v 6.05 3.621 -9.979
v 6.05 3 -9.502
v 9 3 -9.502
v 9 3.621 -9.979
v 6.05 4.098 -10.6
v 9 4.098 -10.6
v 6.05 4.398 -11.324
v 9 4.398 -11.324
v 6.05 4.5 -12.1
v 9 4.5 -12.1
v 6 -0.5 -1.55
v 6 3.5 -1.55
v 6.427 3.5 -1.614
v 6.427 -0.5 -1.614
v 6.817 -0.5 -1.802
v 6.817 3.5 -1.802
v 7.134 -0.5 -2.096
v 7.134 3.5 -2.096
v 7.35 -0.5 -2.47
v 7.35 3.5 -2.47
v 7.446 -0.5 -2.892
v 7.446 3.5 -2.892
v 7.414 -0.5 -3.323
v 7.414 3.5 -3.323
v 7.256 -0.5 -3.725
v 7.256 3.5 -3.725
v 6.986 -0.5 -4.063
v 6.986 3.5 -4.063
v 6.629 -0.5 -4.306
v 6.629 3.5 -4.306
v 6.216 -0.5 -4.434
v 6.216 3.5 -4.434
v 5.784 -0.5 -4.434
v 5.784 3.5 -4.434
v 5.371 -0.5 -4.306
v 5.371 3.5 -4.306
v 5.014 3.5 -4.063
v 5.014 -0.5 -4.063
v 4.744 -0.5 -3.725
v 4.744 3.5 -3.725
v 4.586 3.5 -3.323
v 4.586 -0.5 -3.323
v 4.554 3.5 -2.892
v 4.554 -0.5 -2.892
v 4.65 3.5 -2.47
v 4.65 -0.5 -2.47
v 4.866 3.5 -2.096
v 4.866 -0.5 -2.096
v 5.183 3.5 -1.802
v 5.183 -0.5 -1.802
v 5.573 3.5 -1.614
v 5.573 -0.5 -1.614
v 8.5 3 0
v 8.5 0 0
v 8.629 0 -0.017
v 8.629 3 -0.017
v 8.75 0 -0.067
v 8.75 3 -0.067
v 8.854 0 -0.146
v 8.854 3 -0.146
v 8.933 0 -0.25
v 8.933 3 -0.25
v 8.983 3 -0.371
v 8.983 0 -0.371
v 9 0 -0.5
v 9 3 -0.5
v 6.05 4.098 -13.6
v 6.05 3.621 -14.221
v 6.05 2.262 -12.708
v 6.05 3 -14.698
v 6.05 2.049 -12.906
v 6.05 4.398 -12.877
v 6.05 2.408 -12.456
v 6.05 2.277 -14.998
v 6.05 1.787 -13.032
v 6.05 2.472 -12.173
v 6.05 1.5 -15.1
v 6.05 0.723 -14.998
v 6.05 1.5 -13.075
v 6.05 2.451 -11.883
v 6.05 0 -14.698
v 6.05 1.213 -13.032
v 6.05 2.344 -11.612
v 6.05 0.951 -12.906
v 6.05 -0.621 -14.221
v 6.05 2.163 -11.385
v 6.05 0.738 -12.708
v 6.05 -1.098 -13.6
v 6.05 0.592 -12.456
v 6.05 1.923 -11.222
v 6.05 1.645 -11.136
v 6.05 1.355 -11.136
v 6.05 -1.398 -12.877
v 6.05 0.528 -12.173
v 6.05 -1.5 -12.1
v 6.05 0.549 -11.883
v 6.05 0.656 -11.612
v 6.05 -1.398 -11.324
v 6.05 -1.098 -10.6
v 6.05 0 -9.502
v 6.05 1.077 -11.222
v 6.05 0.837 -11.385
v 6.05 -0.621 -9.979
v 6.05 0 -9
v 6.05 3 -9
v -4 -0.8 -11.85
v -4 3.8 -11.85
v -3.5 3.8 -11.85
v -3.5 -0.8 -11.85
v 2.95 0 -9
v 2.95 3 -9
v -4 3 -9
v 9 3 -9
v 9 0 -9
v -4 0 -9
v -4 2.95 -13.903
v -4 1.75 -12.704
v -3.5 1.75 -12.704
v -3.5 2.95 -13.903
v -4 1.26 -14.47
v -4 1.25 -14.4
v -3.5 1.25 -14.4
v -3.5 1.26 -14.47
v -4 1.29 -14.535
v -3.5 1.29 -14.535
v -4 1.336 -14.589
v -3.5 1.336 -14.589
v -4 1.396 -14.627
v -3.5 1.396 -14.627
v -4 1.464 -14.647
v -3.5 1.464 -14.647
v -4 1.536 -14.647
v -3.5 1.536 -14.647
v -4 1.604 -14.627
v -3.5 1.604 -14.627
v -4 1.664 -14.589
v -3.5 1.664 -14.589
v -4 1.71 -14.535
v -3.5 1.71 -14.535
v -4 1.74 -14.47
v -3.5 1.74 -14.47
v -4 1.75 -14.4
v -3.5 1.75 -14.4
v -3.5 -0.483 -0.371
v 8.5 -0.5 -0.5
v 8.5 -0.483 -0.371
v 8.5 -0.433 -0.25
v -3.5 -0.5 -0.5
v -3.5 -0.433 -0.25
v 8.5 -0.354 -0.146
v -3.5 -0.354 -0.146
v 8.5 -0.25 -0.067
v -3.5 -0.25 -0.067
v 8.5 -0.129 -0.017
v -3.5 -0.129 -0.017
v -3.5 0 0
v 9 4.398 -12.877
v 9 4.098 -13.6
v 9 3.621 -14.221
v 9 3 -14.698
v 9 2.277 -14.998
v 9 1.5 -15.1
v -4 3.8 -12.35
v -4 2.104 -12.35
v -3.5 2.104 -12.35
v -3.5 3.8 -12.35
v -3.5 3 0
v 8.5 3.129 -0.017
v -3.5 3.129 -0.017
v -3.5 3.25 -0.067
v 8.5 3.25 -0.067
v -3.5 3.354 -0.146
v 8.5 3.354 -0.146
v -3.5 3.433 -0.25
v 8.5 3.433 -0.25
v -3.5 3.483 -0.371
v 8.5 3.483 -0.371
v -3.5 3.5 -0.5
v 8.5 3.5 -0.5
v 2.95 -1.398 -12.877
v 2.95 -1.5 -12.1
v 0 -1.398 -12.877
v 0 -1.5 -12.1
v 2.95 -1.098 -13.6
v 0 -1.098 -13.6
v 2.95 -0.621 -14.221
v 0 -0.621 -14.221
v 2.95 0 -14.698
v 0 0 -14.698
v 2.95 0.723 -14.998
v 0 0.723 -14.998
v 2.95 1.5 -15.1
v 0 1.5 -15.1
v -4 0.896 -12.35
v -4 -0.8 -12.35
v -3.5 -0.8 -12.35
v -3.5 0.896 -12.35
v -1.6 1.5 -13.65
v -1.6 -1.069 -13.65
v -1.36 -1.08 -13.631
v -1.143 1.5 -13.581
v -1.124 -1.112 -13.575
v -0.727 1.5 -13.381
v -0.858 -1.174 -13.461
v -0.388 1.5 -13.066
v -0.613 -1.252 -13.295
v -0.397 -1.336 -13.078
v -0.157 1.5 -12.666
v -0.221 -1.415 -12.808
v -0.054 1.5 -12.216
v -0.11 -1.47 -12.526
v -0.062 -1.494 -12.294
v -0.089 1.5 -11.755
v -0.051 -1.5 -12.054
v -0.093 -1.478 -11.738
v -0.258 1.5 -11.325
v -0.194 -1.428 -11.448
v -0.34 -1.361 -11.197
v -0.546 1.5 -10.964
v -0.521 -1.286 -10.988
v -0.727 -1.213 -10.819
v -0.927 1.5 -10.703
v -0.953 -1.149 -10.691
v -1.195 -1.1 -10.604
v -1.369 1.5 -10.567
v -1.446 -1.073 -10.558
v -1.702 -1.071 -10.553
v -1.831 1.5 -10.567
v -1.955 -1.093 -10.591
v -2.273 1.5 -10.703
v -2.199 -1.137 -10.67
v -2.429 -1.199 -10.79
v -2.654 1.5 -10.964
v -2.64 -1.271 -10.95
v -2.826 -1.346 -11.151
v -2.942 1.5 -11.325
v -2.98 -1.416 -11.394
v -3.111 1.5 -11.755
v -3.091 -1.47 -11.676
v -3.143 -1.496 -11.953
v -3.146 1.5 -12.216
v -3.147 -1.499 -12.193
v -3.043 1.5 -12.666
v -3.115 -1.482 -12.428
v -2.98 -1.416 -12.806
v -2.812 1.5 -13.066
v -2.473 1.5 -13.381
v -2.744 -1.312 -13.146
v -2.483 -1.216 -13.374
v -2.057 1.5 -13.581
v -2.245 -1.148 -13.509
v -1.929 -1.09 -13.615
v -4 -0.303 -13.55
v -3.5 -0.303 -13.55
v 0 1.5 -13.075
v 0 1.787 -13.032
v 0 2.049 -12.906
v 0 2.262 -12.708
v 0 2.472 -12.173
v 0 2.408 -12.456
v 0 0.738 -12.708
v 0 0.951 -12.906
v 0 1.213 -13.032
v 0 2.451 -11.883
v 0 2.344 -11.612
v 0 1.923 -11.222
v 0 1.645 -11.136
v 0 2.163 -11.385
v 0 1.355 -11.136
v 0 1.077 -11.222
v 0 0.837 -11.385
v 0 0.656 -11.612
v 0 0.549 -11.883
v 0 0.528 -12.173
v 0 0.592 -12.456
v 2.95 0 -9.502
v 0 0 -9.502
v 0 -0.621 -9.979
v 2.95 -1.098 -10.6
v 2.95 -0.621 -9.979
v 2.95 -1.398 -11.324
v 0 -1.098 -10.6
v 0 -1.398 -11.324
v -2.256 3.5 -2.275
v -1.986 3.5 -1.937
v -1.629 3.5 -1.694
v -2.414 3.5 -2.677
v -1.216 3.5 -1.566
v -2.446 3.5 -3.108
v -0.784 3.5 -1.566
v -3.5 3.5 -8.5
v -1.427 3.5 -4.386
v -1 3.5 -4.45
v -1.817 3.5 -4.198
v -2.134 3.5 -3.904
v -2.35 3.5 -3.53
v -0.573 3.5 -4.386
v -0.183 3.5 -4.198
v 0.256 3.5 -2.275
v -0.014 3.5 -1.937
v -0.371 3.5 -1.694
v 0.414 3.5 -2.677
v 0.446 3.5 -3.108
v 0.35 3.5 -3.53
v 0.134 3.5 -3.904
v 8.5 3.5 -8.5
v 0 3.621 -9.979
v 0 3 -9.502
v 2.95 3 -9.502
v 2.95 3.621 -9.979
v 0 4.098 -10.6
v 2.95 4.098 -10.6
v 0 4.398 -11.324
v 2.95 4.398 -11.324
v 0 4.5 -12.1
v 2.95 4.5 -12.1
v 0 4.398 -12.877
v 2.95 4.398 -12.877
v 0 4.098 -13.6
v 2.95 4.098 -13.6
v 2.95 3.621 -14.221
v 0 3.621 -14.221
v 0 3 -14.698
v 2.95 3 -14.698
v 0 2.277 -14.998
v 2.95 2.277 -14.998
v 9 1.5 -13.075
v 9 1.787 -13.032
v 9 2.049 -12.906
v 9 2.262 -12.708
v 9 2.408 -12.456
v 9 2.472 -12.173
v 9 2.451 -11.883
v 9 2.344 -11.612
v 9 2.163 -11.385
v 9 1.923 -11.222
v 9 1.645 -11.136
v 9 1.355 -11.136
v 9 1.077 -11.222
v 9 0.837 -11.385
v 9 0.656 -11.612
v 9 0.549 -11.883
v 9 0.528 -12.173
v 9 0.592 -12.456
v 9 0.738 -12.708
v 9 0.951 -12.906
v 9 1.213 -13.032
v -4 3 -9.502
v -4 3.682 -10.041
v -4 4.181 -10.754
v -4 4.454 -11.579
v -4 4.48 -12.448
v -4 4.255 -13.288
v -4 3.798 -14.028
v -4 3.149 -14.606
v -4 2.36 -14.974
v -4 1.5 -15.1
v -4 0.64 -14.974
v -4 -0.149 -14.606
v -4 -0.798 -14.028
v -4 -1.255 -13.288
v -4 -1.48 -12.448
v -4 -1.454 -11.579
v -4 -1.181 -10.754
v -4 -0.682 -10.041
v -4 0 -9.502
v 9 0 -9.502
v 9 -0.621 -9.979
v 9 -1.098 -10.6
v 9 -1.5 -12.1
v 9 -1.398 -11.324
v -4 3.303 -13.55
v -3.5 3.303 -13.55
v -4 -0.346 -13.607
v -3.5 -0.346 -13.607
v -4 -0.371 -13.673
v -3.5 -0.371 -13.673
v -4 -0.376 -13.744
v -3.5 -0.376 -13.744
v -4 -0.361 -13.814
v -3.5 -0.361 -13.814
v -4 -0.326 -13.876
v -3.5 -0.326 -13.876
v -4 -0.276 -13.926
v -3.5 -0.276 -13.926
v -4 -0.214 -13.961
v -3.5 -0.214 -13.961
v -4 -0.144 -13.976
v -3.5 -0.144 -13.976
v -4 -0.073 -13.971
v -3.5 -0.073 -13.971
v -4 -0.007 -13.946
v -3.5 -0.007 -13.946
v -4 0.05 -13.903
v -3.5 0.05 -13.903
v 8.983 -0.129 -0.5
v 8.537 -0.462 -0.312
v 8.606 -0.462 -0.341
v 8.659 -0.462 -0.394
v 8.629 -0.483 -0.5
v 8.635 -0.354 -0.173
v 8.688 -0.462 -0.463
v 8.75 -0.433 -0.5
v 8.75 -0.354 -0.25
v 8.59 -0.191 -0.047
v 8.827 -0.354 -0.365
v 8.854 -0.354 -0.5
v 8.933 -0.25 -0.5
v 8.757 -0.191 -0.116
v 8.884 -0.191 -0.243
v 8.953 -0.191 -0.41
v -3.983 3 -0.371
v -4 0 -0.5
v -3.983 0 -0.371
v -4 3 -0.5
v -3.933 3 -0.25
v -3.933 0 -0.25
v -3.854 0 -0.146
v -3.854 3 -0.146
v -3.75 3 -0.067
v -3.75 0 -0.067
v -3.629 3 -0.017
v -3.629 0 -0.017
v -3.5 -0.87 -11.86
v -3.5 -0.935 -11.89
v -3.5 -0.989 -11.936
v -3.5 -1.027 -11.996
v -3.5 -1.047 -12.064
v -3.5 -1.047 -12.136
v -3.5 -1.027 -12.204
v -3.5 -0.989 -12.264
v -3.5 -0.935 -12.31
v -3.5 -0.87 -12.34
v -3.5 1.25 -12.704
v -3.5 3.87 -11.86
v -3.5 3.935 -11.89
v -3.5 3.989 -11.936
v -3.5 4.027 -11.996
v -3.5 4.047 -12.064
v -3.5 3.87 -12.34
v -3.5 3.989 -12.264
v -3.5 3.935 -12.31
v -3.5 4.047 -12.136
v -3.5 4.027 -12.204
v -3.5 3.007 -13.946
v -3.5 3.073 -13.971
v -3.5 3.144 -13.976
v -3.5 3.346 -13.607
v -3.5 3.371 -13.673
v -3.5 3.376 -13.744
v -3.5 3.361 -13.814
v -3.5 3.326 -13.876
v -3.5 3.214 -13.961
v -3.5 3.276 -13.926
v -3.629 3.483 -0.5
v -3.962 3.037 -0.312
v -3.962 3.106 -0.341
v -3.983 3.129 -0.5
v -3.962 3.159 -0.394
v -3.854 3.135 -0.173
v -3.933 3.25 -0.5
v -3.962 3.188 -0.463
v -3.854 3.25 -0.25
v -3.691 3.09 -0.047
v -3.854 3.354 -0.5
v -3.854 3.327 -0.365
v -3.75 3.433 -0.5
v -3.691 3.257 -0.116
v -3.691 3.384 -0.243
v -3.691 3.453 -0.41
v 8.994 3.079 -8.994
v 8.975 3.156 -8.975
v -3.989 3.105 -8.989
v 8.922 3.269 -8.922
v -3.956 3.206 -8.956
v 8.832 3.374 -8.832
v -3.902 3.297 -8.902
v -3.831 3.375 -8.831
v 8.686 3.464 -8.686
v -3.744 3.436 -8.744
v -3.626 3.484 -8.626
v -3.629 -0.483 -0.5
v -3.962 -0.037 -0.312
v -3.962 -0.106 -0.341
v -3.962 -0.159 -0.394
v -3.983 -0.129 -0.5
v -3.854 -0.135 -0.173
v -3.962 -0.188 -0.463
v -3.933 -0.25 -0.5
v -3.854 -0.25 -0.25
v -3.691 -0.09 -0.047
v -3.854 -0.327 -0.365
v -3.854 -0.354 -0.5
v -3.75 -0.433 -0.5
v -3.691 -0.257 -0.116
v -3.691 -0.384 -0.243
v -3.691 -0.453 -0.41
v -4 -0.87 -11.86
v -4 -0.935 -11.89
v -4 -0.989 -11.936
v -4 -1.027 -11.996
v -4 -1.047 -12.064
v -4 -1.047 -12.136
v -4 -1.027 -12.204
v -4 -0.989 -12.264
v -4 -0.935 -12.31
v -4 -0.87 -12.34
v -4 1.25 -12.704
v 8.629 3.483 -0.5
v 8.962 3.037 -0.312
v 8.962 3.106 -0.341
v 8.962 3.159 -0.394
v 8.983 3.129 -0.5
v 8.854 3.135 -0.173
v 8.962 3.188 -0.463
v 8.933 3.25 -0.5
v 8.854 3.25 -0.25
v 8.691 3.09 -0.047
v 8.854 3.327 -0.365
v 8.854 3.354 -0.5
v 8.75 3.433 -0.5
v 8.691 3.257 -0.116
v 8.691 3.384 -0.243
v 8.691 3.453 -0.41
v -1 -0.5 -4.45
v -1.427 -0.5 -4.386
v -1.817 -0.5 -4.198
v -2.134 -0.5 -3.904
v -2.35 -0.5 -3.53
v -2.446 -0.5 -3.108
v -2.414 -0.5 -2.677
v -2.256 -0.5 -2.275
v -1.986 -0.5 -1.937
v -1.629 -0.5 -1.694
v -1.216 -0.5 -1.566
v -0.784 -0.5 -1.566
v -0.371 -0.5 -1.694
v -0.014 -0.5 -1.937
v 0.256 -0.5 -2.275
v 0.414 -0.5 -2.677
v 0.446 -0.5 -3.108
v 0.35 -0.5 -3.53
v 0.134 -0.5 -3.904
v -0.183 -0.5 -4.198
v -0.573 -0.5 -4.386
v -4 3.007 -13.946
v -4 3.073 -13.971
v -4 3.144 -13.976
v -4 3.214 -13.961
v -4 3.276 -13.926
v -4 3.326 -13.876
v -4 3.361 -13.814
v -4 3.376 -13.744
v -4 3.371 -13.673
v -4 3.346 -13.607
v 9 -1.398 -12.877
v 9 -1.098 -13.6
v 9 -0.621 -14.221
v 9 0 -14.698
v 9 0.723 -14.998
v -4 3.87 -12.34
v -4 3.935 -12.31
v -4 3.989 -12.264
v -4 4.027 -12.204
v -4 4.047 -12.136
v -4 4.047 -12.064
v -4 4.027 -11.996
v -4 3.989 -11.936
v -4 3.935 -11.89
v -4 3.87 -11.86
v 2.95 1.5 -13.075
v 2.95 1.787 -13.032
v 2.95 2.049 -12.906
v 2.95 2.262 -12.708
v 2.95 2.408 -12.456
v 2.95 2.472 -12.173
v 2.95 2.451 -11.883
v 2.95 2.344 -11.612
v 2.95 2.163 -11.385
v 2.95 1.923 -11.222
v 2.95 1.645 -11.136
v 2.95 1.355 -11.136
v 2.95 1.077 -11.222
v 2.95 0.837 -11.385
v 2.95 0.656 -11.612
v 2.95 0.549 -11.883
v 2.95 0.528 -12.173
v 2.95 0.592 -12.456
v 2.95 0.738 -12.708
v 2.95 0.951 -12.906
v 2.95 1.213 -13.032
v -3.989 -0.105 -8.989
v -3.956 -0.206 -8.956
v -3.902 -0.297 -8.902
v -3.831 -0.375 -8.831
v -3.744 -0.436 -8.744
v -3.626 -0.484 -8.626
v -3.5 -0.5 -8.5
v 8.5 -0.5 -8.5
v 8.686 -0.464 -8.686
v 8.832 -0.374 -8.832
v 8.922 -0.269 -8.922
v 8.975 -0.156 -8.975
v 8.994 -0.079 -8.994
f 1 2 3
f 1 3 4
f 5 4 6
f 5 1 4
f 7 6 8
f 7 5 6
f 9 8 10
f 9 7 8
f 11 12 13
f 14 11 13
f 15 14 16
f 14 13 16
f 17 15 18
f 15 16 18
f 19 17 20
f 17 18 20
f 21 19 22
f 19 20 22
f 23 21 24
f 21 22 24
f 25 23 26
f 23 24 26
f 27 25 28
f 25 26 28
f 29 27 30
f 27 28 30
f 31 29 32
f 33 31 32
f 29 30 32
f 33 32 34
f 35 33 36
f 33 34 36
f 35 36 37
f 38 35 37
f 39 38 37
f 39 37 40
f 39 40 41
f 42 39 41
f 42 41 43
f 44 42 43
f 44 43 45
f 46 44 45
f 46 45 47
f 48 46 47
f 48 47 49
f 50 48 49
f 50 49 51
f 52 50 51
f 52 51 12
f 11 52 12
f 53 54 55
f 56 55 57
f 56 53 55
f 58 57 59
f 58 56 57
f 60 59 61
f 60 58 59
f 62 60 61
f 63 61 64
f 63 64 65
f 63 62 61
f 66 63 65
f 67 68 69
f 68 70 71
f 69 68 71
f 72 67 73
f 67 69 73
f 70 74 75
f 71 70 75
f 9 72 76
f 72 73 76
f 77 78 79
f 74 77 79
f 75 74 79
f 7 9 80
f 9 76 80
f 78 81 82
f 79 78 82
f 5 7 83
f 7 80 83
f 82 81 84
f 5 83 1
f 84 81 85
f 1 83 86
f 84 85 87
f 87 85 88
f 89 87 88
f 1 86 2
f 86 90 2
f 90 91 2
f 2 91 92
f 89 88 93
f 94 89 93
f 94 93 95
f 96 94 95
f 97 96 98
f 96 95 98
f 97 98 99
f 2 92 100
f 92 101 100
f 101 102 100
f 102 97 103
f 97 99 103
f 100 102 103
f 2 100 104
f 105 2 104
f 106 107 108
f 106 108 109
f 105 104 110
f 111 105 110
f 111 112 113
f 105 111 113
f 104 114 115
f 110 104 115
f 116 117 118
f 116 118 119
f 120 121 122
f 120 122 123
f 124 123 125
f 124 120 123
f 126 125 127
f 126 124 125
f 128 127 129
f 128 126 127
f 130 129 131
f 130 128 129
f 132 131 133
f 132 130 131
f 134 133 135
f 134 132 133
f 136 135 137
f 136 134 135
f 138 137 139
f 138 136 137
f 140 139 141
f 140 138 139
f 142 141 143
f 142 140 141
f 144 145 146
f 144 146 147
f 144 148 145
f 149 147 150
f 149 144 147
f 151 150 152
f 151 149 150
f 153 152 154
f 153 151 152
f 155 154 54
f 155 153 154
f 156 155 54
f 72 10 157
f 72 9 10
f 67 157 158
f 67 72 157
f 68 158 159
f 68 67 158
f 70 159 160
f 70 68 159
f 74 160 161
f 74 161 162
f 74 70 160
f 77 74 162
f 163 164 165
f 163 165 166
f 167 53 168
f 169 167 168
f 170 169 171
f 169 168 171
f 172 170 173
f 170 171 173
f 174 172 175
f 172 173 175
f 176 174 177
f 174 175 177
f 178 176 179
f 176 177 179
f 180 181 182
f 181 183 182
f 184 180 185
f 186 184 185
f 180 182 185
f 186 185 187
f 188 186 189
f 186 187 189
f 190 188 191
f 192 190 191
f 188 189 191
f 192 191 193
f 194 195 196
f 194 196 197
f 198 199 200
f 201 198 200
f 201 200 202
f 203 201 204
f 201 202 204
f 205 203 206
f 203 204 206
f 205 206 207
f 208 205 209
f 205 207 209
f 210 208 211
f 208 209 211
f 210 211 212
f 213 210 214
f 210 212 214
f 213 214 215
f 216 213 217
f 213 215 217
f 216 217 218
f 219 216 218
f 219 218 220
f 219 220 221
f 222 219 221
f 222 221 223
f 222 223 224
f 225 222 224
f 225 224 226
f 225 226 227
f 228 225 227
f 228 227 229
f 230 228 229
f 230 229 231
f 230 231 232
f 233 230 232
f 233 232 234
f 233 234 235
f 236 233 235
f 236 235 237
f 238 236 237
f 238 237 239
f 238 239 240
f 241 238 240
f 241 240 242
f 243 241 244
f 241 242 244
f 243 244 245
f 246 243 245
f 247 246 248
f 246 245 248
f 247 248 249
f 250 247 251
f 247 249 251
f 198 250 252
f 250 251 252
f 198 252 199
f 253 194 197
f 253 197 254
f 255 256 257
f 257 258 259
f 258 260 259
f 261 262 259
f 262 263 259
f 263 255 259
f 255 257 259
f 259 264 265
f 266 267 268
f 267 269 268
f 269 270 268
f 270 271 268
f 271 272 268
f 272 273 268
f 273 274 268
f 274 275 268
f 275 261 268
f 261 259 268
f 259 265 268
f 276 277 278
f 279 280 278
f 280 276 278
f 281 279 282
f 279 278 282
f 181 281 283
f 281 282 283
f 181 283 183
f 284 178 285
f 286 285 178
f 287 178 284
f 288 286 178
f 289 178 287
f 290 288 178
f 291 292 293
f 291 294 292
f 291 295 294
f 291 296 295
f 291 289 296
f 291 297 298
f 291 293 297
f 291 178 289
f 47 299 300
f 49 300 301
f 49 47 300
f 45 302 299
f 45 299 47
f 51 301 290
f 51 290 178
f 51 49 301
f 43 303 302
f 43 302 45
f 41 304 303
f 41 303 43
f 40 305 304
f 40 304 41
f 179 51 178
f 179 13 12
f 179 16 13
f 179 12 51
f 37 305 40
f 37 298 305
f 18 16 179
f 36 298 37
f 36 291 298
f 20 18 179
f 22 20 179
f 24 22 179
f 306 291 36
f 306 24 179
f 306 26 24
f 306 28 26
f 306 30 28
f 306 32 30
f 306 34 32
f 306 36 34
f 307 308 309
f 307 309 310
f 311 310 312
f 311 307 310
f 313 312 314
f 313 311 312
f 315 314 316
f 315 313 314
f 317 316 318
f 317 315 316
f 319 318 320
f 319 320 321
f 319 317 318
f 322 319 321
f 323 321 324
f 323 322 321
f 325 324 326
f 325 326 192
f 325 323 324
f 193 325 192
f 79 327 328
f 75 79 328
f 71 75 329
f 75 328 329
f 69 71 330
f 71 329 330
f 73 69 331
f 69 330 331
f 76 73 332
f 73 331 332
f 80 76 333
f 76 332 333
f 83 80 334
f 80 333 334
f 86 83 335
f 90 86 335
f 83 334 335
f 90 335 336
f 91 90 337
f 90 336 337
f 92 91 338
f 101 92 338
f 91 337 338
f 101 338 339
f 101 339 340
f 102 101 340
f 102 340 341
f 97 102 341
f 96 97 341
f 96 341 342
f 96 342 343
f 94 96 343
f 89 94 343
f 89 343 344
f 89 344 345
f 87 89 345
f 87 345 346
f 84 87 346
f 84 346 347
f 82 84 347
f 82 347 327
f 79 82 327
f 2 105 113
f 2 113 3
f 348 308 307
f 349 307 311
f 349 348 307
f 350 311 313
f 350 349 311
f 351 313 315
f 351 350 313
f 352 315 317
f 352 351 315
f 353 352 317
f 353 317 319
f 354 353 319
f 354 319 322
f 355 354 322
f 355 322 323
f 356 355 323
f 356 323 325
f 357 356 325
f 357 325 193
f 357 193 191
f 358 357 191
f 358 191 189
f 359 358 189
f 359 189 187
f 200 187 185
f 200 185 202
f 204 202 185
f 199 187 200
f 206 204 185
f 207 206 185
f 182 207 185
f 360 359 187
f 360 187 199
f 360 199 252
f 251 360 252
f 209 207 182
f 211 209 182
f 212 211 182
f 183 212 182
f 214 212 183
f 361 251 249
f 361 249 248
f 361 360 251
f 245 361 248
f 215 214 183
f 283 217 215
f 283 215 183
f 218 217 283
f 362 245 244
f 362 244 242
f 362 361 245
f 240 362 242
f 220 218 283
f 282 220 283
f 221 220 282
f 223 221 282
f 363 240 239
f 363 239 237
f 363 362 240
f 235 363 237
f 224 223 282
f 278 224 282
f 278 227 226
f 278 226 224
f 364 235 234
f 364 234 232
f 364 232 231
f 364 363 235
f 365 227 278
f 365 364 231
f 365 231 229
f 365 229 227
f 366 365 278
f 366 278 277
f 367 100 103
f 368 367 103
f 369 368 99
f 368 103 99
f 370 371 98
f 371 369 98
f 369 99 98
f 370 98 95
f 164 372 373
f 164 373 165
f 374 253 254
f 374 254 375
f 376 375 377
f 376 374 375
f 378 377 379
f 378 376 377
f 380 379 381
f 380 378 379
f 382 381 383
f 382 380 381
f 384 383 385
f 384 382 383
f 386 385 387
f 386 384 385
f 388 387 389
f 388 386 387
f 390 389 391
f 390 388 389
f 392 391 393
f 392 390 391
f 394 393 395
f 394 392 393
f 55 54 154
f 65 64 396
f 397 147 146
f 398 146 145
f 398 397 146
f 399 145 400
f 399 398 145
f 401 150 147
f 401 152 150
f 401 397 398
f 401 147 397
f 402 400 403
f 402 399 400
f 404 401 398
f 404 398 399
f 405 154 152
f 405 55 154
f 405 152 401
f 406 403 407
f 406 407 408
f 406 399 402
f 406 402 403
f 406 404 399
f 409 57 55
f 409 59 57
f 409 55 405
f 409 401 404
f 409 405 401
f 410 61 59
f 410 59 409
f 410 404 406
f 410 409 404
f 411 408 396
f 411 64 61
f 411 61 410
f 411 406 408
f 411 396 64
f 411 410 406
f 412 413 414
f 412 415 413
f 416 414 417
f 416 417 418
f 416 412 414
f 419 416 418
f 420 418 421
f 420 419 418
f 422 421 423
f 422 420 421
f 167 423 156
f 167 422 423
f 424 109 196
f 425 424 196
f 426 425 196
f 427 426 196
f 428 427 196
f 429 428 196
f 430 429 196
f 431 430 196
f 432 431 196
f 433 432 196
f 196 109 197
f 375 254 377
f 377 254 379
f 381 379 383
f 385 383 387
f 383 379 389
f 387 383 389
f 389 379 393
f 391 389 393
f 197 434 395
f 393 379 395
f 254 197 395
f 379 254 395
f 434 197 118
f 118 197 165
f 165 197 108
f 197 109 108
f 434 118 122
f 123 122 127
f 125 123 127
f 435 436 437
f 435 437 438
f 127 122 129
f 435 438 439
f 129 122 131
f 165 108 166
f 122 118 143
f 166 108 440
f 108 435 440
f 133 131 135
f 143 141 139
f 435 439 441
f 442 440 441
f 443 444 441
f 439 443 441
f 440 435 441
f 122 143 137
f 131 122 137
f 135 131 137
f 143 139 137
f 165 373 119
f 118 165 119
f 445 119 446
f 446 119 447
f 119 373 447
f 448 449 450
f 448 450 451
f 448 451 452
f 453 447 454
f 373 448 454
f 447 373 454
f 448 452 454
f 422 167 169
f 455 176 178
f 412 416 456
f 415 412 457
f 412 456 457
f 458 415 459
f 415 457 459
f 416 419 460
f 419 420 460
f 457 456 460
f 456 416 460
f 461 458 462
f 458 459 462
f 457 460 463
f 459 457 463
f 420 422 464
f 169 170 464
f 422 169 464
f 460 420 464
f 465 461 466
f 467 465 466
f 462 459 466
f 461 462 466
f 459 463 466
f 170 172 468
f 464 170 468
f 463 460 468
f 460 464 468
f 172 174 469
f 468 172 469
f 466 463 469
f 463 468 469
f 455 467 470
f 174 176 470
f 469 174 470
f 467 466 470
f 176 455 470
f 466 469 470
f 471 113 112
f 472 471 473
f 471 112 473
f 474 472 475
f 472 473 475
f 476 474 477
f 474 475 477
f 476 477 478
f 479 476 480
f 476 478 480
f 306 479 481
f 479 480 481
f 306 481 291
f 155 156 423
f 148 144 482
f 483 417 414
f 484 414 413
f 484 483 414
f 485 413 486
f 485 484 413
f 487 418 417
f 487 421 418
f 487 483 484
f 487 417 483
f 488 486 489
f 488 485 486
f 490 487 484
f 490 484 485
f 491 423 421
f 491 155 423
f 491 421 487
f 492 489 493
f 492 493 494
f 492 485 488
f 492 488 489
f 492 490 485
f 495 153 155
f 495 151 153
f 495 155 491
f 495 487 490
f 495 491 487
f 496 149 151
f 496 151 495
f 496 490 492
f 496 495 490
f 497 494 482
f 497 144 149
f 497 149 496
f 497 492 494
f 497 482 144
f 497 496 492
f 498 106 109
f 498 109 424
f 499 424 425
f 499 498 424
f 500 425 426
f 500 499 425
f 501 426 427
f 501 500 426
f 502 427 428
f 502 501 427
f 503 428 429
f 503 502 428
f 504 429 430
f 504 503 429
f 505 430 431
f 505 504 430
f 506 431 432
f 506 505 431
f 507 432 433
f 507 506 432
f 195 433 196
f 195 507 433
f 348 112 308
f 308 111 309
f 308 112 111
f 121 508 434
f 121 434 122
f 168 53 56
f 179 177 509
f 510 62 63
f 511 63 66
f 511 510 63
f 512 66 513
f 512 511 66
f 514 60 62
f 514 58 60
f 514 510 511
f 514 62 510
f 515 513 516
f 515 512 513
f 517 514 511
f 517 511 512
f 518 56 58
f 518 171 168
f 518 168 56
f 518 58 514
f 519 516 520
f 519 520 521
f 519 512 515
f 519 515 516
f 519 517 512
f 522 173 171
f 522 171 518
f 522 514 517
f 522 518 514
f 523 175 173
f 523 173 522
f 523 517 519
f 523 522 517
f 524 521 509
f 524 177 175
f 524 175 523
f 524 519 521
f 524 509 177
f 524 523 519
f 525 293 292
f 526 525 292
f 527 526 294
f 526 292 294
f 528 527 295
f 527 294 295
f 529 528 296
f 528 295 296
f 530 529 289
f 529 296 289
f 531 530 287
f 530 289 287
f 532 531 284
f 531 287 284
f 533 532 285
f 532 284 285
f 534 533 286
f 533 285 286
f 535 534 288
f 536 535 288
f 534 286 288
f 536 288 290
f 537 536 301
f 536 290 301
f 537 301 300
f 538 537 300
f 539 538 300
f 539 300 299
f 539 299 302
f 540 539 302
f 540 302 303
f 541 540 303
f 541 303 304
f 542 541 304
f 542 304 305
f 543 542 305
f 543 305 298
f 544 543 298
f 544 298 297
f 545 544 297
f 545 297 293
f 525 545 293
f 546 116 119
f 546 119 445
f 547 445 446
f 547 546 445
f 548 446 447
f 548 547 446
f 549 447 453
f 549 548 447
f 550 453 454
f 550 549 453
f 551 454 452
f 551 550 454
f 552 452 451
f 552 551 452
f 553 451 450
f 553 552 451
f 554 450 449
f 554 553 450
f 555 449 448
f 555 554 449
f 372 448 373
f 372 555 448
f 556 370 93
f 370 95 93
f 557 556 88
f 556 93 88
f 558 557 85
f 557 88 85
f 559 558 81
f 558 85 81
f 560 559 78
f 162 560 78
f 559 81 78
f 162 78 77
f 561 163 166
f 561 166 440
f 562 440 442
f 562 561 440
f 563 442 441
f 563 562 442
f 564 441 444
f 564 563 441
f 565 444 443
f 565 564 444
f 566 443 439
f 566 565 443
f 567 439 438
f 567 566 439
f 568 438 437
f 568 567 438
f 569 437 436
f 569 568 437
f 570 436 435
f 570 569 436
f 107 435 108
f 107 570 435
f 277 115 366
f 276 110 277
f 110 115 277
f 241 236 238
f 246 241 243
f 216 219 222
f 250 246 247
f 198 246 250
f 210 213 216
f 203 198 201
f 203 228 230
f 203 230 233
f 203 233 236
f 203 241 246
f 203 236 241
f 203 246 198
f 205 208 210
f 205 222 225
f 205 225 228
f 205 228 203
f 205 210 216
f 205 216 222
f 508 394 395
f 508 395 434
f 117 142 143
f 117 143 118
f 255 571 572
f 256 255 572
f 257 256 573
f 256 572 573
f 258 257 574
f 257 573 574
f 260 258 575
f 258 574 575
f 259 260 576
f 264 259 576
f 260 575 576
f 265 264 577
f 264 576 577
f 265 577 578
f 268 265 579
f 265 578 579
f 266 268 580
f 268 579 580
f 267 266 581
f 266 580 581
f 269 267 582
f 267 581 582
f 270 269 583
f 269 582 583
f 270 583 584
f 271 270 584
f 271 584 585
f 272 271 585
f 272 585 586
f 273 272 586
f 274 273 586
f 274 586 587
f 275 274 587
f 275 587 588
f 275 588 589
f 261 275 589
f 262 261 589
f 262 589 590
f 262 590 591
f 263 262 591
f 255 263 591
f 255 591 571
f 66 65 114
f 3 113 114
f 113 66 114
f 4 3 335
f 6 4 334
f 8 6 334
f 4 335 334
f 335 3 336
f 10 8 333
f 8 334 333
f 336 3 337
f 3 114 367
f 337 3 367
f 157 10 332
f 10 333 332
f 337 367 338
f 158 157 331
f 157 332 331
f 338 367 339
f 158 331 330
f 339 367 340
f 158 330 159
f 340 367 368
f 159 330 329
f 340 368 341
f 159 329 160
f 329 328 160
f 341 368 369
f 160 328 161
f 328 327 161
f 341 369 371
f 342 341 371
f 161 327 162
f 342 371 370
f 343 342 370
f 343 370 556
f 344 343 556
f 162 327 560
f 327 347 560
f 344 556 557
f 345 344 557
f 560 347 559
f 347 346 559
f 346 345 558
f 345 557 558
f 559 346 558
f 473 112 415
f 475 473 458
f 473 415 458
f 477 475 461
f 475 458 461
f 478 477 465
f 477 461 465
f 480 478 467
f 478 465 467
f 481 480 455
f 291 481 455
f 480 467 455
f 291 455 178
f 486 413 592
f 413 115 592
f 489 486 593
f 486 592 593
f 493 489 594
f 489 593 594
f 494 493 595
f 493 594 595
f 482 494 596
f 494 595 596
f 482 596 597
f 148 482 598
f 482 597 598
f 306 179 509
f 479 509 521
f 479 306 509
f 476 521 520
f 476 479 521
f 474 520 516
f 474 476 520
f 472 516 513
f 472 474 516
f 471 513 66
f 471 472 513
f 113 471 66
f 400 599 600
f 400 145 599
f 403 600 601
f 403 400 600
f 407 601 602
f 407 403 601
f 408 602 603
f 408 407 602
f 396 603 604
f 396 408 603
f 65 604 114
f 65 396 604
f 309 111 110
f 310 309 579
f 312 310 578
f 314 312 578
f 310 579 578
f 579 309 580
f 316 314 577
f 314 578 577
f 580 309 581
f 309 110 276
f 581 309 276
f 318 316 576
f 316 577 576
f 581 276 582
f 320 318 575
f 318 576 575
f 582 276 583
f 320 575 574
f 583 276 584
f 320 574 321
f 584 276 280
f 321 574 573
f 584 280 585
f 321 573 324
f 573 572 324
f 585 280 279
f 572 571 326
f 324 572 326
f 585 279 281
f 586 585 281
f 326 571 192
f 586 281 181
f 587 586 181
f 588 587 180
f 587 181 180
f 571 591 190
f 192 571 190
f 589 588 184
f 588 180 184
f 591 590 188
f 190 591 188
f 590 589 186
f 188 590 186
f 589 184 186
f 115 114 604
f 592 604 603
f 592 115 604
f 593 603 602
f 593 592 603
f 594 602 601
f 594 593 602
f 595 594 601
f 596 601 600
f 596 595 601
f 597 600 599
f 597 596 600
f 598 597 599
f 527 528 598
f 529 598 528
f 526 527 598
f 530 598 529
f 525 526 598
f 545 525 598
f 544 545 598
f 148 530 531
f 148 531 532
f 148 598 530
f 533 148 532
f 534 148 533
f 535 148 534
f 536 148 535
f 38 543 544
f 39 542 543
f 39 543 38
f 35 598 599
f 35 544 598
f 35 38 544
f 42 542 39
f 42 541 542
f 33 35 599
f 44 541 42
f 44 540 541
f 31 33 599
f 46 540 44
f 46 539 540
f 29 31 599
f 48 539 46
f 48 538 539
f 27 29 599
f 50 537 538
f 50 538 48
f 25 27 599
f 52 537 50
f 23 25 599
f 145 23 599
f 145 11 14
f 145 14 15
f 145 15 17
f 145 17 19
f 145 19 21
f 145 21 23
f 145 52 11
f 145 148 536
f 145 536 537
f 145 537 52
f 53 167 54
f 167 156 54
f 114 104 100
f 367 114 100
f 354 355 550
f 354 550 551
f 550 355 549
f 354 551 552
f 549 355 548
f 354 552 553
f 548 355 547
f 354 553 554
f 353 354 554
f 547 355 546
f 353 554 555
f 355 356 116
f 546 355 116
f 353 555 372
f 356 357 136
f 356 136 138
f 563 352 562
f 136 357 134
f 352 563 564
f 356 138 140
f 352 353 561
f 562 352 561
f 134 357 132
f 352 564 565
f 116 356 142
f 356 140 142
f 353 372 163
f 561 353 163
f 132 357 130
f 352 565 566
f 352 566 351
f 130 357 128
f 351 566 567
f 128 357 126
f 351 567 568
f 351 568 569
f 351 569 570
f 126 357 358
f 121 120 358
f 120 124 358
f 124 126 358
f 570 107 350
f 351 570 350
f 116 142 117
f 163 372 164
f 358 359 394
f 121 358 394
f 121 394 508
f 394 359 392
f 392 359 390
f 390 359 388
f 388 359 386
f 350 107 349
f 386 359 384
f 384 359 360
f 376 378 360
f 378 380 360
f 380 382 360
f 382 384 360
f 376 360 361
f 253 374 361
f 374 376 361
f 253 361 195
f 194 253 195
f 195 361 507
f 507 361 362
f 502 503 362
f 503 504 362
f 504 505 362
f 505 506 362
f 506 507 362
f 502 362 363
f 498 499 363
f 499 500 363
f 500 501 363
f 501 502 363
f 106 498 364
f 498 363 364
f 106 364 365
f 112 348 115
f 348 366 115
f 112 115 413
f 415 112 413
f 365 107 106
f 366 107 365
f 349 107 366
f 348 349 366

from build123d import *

# Parameters (mm, degrees)
SKETCH1_W           = 9
SKETCH1_H           = 9
BOSS_EXTRUDE1_DEPTH = 3
SKETCH2_W           = 2.95
SKETCH2_H           = 6
BOSS_EXTRUDE2_DEPTH = 6.1
FILLET1_R           = 3
SKETCH3_R           = 0.975
CUT_EXTRUDE1_DEPTH  = 11.1
CUT_EXTRUDE3_DEPTH  = 21.1
BOSS_EXTRUDE3_START = 4
SKETCH5_R           = 3
BOSS_EXTRUDE3_DEPTH = 4
SKETCH8_R           = 1.55
CUT_EXTRUDE4_DEPTH  = 3
CUT_EXTRUDE5_DEPTH  = 0.5
BOSS_EXTRUDE4_START = 4
BOSS_EXTRUDE4_DEPTH = 4
BOSS_EXTRUDE5_DEPTH = 0.5
BOSS_EXTRUDE6_DEPTH = 0.5
SKETCH15_W          = 0.501923789
SKETCH15_H          = 0.5
CUT_EXTRUDE6_DEPTH  = 19.5
SKETCH16_R          = 1.45
CUT_EXTRUDE7_DEPTH  = 19.5
FILLET2_R           = 0.5


with BuildPart() as part:
    # Sketch1 → Boss-Extrude1 (new body)
    with BuildSketch(Plane(origin=(0, 0, 0), x_dir=(1, 0, 0), z_dir=(0, 1, 0))):
        with Locations((4.5, 4.5)):
            Rectangle(SKETCH1_W, SKETCH1_H)
    extrude(amount=BOSS_EXTRUDE1_DEPTH)

    # Sketch2 → Boss-Extrude2 (add)
    with BuildSketch(Plane(origin=(0, 0, -9), x_dir=(-1, 0, 0), z_dir=(0, 0, -1))):
        with Locations((-7.525, 1.5)):
            Rectangle(SKETCH2_W, SKETCH2_H)
        with Locations((-1.475, 1.5)):
            Rectangle(SKETCH2_W, SKETCH2_H)
    extrude(amount=BOSS_EXTRUDE2_DEPTH)

    # Fillet1
    fillet1_edges = [part.edges().sort_by_distance(p)[0] for p in [
        (1.475, 4.5, -15.1),
        (1.475, -1.5, -15.1),
        (7.525, -1.5, -15.1),
        (7.525, 4.5, -15.1),
    ]]
    fillet(fillet1_edges, radius=FILLET1_R - 0.0001)  # a hair under: the kernel refuses the full size

    # Sketch3 → Cut-Extrude1 (cut)
    with BuildSketch(Plane(origin=(9, 0, 0), x_dir=(0, 0, -1), z_dir=(1, 0, 0))):
        with Locations((12.1, 1.5)):
            Circle(SKETCH3_R)
    extrude(amount=-CUT_EXTRUDE1_DEPTH, mode=Mode.SUBTRACT)

    # Sketch6 → Cut-Extrude3 (cut)
    with BuildSketch(Plane.ZY):
        with BuildLine():
            Line((-12.1, 4.5), (-9, 4.5))
            Line((-9, 4.5), (-9, 3))
            Line((-9, 3), (-9.501923789, 3))
            ThreePointArc((-9.501923789, 3), (-10.6, 4.098076211), (-12.1, 4.5))
        make_face()
        with BuildLine():
            Line((-12.1, -1.5), (-9, -1.5))
            Line((-9, -1.5), (-9, 0))
            Line((-9, 0), (-9.501923789, 0))
            ThreePointArc((-9.501923789, 0), (-10.6, -1.098076211), (-12.1, -1.5))
        make_face()
    extrude(amount=-CUT_EXTRUDE3_DEPTH, mode=Mode.SUBTRACT)

    # Sketch5 → Boss-Extrude3 (add)
    with BuildSketch(Plane.ZY.offset(BOSS_EXTRUDE3_START)):
        with Locations((-12.1, 1.5)):
            Circle(SKETCH5_R)
    extrude(amount=-BOSS_EXTRUDE3_DEPTH)

    # Sketch8 → Cut-Extrude4 (cut)
    with BuildSketch(Plane(origin=(0, -1.5, 0), x_dir=(-1, 0, 0), z_dir=(0, -1, 0))):
        with Locations(Location((1.6, 12.1, 0), (0, 0, 90))):
            Circle(SKETCH8_R)
    extrude(amount=-CUT_EXTRUDE4_DEPTH, mode=Mode.SUBTRACT)

    # Sketch9 → Cut-Extrude5 (cut)
    with BuildSketch(Plane.ZY.offset(4)):
        with BuildLine():
            Line((-11.85, 1.5), (-11.85, -0.8))
            ThreePointArc((-11.85, -0.8), (-12.1, -1.05), (-12.35, -0.8))
            Line((-12.35, -0.8), (-12.35, 0.896446609))
            Line((-12.35, 0.896446609), (-13.549568901, -0.303122292))
            ThreePointArc((-13.549568901, -0.303122292), (-13.903122292, -0.303122292), (-13.903122292, 0.050431099))
            Line((-13.903122292, 0.050431099), (-12.703553391, 1.25))
            Line((-12.703553391, 1.25), (-14.4, 1.25))
            ThreePointArc((-14.4, 1.25), (-14.65, 1.5), (-14.4, 1.75))
            Line((-14.4, 1.75), (-12.703553391, 1.75))
            Line((-12.703553391, 1.75), (-13.903122292, 2.949568901))
            ThreePointArc((-13.903122292, 2.949568901), (-13.903122292, 3.303122292), (-13.549568901, 3.303122292))
            Line((-13.549568901, 3.303122292), (-12.35, 2.103553391))
            Line((-12.35, 2.103553391), (-12.35, 3.8))
            ThreePointArc((-12.35, 3.8), (-12.1, 4.05), (-11.85, 3.8))
            Line((-11.85, 3.8), (-11.85, 1.5))
        make_face()
    extrude(amount=-CUT_EXTRUDE5_DEPTH, mode=Mode.SUBTRACT)

    # Sketch10 → Boss-Extrude4 (add)
    with BuildSketch(Plane.ZY.offset(BOSS_EXTRUDE4_START)):
        with BuildLine():
            Line((-9.501923789, 0), (0, 0))
            Line((0, 0), (0, 3))
            Line((0, 3), (-9.501923789, 3))
            ThreePointArc((-9.501923789, 3), (-9.1, 1.5), (-9.501923789, 0))
        make_face()
    extrude(amount=-BOSS_EXTRUDE4_DEPTH)

    # Sketch12 → Boss-Extrude5 (add)
    with BuildSketch(Plane.XZ):
        Polygon((9, 0), (-4, 0), (-4, -9.501923789), (2.95, -9.501923789), (2.95, -9), (6.05, -9), (6.05, -9.501923789), (9, -9.501923789), align=None)
    extrude(amount=BOSS_EXTRUDE5_DEPTH)

    # Sketch13 → Boss-Extrude6 (add)
    with BuildSketch(Plane(origin=(0, 3, 0), x_dir=(1, 0, 0), z_dir=(0, 1, 0))):
        Polygon((2.95, 9.501923789), (-4, 9.501923789), (-4, 0), (9, 0), (9, 9.501923789), (6.05, 9.501923789), (6.05, 9), (2.95, 9), align=None)
    extrude(amount=BOSS_EXTRUDE6_DEPTH)

    # Sketch15 → Cut-Extrude6 (cut)
    with BuildSketch(Plane(origin=(9, 0, 0), x_dir=(0, 0, -1), z_dir=(1, 0, 0))):
        with Locations((9.250961895, 3.25)):
            Rectangle(SKETCH15_W, SKETCH15_H)
        with Locations((9.250961895, -0.25)):
            Rectangle(SKETCH15_W, SKETCH15_H)
    extrude(amount=-CUT_EXTRUDE6_DEPTH, mode=Mode.SUBTRACT)

    # Sketch16 → Cut-Extrude7 (cut)
    with BuildSketch(Plane(origin=(0, 3.5, 0), x_dir=(1, 0, 0), z_dir=(0, 1, 0))):
        with Locations(Location((6, 3, 0), (0, 0, 270))):
            Circle(SKETCH16_R)
        with Locations(Location((-1, 3, 0), (0, 0, 90))):
            Circle(SKETCH16_R)
    extrude(amount=-CUT_EXTRUDE7_DEPTH, mode=Mode.SUBTRACT)

    # Fillet2
    fillet2_edges = [part.edges().sort_by_distance(p)[0] for p in [
        (2.5, 3.5, 0),
        (9, 1.25, 0),
        (2.5, -0.5, 0),
        (-4, 1.5, 0),
        (-4, -0.5, -4.5),
        (-4, 3.5, -4.5),
        (9, 3.5, -4.5),
        (9, -0.5, -4.5),
        (2.5, 3.5, -9),
        (2.5, -0.5, -9),
    ]]
    fillet(fillet2_edges, radius=FILLET2_R - 0.0001)  # a hair under: the kernel refuses the full size


solid = part.part
